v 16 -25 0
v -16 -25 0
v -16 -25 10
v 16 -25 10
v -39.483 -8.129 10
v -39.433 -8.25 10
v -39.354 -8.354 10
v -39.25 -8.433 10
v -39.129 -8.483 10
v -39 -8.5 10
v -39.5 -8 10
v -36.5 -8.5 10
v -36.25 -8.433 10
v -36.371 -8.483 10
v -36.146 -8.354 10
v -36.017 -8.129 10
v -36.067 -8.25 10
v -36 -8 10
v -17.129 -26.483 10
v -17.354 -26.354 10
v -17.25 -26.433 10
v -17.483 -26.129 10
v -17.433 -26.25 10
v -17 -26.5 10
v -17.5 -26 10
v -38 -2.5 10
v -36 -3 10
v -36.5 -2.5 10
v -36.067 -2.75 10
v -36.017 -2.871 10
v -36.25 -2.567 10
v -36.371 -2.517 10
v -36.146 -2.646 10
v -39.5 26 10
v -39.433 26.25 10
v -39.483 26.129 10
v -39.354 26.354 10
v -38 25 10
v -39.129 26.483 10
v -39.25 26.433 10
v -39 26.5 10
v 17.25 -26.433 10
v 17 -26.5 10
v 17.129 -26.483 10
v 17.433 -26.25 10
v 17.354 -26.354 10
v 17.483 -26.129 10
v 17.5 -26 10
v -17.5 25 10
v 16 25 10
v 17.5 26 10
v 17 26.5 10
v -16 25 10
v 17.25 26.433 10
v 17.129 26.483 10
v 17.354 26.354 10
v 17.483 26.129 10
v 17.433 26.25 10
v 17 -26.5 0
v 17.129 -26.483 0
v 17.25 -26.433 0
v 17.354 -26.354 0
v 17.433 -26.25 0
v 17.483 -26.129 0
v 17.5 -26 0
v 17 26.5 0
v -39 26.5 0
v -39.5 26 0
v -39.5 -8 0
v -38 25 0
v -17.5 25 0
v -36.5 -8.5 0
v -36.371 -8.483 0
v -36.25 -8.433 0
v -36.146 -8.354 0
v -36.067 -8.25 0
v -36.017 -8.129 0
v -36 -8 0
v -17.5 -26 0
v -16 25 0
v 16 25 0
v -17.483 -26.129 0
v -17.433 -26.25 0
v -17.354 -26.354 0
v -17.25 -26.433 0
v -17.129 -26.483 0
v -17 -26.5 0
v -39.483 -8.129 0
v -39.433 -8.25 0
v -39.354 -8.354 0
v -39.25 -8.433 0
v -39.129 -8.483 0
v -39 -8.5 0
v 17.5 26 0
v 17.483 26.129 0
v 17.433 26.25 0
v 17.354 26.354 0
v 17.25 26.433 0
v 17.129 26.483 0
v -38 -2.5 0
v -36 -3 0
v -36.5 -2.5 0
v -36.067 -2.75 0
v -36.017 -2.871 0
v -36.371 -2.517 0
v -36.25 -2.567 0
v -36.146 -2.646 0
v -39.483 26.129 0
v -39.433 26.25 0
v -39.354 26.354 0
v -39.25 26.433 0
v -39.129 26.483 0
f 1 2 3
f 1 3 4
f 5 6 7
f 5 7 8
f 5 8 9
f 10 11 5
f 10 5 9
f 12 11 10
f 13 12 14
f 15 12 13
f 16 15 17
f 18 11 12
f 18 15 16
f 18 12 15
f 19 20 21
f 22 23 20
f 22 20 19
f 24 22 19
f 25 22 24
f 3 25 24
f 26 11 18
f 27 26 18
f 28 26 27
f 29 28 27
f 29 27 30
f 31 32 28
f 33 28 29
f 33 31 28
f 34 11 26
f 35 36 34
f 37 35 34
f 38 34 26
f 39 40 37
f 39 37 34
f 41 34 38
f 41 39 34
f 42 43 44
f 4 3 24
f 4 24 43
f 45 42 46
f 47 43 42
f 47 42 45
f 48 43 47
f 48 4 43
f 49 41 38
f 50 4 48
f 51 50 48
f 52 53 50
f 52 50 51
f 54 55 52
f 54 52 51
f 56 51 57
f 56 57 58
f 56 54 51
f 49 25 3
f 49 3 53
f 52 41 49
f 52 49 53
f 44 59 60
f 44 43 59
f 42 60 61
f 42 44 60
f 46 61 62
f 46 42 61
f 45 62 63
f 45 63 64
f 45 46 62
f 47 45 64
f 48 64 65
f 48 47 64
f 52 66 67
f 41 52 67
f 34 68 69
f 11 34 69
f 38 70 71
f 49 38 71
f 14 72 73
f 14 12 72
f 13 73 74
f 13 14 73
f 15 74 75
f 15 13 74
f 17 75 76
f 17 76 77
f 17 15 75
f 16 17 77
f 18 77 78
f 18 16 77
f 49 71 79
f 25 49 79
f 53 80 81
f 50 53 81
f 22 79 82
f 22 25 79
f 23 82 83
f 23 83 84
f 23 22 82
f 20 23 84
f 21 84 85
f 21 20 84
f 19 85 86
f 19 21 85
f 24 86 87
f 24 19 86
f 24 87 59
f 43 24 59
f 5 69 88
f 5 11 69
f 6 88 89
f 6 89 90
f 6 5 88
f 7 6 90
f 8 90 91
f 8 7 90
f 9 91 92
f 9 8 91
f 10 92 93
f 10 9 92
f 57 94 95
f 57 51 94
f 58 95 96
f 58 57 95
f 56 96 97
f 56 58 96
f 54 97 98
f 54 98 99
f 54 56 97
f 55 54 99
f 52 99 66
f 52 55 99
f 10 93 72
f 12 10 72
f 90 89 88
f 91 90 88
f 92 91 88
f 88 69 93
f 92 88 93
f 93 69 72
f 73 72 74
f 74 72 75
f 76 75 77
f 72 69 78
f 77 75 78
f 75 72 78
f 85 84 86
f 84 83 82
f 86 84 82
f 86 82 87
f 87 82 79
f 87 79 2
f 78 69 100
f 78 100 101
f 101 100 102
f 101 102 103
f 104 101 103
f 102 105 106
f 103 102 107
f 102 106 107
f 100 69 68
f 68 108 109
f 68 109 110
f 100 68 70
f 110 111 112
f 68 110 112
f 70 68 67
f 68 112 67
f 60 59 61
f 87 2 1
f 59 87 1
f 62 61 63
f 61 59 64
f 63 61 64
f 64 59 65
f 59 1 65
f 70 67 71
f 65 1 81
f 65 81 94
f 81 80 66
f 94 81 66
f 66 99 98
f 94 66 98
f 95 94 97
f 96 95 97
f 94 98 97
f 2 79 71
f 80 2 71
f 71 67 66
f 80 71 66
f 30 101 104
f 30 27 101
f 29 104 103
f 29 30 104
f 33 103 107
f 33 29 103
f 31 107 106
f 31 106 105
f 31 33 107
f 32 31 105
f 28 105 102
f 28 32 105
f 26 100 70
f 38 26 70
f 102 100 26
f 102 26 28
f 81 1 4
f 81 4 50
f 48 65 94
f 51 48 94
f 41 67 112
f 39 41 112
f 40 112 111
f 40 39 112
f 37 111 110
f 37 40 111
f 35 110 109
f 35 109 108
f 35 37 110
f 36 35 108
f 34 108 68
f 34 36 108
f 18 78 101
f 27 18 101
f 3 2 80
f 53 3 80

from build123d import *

# Parameters (mm, degrees)
F0_W     = 32
F0_H     = 50
F0_W_2   = 2
F0_H_2   = 6
F1_DEPTH = 10
F2_R     = 0.5


with BuildPart() as f1:
    # F0 (on Top) → F1 (new body)
    with BuildSketch(Plane.XY):
        Polygon((-17.5, 26.5), (-17.5, 25), (-17.5, -26.5), (17.5, -26.5), (17.5, 26.5), (-16, 26.5), align=None)
        Rectangle(F0_W, F0_H, mode=Mode.SUBTRACT)
        Polygon((-38, 25), (-17.5, 25), (-17.5, 26.5), (-39.5, 26.5), (-39.5, -8.5), (-38, -8.5), (-38, -2.5), align=None)
        with Locations((-37, -5.5)):
            Rectangle(F0_W_2, F0_H_2)
    extrude(amount=F1_DEPTH)

    # F2
    f2_edges = [f1.edges().sort_by_distance(p)[0] for p in [
        (-36, -2.5, 5),
        (-36, -8.5, 5),
        (17.5, -26.5, 5),
        (17.5, 26.5, 5),
        (-17.5, -26.5, 5),
        (-39.5, 26.5, 5),
        (-39.5, -8.5, 5),
    ]]
    fillet(f2_edges, radius=F2_R)


solid = f1.part
